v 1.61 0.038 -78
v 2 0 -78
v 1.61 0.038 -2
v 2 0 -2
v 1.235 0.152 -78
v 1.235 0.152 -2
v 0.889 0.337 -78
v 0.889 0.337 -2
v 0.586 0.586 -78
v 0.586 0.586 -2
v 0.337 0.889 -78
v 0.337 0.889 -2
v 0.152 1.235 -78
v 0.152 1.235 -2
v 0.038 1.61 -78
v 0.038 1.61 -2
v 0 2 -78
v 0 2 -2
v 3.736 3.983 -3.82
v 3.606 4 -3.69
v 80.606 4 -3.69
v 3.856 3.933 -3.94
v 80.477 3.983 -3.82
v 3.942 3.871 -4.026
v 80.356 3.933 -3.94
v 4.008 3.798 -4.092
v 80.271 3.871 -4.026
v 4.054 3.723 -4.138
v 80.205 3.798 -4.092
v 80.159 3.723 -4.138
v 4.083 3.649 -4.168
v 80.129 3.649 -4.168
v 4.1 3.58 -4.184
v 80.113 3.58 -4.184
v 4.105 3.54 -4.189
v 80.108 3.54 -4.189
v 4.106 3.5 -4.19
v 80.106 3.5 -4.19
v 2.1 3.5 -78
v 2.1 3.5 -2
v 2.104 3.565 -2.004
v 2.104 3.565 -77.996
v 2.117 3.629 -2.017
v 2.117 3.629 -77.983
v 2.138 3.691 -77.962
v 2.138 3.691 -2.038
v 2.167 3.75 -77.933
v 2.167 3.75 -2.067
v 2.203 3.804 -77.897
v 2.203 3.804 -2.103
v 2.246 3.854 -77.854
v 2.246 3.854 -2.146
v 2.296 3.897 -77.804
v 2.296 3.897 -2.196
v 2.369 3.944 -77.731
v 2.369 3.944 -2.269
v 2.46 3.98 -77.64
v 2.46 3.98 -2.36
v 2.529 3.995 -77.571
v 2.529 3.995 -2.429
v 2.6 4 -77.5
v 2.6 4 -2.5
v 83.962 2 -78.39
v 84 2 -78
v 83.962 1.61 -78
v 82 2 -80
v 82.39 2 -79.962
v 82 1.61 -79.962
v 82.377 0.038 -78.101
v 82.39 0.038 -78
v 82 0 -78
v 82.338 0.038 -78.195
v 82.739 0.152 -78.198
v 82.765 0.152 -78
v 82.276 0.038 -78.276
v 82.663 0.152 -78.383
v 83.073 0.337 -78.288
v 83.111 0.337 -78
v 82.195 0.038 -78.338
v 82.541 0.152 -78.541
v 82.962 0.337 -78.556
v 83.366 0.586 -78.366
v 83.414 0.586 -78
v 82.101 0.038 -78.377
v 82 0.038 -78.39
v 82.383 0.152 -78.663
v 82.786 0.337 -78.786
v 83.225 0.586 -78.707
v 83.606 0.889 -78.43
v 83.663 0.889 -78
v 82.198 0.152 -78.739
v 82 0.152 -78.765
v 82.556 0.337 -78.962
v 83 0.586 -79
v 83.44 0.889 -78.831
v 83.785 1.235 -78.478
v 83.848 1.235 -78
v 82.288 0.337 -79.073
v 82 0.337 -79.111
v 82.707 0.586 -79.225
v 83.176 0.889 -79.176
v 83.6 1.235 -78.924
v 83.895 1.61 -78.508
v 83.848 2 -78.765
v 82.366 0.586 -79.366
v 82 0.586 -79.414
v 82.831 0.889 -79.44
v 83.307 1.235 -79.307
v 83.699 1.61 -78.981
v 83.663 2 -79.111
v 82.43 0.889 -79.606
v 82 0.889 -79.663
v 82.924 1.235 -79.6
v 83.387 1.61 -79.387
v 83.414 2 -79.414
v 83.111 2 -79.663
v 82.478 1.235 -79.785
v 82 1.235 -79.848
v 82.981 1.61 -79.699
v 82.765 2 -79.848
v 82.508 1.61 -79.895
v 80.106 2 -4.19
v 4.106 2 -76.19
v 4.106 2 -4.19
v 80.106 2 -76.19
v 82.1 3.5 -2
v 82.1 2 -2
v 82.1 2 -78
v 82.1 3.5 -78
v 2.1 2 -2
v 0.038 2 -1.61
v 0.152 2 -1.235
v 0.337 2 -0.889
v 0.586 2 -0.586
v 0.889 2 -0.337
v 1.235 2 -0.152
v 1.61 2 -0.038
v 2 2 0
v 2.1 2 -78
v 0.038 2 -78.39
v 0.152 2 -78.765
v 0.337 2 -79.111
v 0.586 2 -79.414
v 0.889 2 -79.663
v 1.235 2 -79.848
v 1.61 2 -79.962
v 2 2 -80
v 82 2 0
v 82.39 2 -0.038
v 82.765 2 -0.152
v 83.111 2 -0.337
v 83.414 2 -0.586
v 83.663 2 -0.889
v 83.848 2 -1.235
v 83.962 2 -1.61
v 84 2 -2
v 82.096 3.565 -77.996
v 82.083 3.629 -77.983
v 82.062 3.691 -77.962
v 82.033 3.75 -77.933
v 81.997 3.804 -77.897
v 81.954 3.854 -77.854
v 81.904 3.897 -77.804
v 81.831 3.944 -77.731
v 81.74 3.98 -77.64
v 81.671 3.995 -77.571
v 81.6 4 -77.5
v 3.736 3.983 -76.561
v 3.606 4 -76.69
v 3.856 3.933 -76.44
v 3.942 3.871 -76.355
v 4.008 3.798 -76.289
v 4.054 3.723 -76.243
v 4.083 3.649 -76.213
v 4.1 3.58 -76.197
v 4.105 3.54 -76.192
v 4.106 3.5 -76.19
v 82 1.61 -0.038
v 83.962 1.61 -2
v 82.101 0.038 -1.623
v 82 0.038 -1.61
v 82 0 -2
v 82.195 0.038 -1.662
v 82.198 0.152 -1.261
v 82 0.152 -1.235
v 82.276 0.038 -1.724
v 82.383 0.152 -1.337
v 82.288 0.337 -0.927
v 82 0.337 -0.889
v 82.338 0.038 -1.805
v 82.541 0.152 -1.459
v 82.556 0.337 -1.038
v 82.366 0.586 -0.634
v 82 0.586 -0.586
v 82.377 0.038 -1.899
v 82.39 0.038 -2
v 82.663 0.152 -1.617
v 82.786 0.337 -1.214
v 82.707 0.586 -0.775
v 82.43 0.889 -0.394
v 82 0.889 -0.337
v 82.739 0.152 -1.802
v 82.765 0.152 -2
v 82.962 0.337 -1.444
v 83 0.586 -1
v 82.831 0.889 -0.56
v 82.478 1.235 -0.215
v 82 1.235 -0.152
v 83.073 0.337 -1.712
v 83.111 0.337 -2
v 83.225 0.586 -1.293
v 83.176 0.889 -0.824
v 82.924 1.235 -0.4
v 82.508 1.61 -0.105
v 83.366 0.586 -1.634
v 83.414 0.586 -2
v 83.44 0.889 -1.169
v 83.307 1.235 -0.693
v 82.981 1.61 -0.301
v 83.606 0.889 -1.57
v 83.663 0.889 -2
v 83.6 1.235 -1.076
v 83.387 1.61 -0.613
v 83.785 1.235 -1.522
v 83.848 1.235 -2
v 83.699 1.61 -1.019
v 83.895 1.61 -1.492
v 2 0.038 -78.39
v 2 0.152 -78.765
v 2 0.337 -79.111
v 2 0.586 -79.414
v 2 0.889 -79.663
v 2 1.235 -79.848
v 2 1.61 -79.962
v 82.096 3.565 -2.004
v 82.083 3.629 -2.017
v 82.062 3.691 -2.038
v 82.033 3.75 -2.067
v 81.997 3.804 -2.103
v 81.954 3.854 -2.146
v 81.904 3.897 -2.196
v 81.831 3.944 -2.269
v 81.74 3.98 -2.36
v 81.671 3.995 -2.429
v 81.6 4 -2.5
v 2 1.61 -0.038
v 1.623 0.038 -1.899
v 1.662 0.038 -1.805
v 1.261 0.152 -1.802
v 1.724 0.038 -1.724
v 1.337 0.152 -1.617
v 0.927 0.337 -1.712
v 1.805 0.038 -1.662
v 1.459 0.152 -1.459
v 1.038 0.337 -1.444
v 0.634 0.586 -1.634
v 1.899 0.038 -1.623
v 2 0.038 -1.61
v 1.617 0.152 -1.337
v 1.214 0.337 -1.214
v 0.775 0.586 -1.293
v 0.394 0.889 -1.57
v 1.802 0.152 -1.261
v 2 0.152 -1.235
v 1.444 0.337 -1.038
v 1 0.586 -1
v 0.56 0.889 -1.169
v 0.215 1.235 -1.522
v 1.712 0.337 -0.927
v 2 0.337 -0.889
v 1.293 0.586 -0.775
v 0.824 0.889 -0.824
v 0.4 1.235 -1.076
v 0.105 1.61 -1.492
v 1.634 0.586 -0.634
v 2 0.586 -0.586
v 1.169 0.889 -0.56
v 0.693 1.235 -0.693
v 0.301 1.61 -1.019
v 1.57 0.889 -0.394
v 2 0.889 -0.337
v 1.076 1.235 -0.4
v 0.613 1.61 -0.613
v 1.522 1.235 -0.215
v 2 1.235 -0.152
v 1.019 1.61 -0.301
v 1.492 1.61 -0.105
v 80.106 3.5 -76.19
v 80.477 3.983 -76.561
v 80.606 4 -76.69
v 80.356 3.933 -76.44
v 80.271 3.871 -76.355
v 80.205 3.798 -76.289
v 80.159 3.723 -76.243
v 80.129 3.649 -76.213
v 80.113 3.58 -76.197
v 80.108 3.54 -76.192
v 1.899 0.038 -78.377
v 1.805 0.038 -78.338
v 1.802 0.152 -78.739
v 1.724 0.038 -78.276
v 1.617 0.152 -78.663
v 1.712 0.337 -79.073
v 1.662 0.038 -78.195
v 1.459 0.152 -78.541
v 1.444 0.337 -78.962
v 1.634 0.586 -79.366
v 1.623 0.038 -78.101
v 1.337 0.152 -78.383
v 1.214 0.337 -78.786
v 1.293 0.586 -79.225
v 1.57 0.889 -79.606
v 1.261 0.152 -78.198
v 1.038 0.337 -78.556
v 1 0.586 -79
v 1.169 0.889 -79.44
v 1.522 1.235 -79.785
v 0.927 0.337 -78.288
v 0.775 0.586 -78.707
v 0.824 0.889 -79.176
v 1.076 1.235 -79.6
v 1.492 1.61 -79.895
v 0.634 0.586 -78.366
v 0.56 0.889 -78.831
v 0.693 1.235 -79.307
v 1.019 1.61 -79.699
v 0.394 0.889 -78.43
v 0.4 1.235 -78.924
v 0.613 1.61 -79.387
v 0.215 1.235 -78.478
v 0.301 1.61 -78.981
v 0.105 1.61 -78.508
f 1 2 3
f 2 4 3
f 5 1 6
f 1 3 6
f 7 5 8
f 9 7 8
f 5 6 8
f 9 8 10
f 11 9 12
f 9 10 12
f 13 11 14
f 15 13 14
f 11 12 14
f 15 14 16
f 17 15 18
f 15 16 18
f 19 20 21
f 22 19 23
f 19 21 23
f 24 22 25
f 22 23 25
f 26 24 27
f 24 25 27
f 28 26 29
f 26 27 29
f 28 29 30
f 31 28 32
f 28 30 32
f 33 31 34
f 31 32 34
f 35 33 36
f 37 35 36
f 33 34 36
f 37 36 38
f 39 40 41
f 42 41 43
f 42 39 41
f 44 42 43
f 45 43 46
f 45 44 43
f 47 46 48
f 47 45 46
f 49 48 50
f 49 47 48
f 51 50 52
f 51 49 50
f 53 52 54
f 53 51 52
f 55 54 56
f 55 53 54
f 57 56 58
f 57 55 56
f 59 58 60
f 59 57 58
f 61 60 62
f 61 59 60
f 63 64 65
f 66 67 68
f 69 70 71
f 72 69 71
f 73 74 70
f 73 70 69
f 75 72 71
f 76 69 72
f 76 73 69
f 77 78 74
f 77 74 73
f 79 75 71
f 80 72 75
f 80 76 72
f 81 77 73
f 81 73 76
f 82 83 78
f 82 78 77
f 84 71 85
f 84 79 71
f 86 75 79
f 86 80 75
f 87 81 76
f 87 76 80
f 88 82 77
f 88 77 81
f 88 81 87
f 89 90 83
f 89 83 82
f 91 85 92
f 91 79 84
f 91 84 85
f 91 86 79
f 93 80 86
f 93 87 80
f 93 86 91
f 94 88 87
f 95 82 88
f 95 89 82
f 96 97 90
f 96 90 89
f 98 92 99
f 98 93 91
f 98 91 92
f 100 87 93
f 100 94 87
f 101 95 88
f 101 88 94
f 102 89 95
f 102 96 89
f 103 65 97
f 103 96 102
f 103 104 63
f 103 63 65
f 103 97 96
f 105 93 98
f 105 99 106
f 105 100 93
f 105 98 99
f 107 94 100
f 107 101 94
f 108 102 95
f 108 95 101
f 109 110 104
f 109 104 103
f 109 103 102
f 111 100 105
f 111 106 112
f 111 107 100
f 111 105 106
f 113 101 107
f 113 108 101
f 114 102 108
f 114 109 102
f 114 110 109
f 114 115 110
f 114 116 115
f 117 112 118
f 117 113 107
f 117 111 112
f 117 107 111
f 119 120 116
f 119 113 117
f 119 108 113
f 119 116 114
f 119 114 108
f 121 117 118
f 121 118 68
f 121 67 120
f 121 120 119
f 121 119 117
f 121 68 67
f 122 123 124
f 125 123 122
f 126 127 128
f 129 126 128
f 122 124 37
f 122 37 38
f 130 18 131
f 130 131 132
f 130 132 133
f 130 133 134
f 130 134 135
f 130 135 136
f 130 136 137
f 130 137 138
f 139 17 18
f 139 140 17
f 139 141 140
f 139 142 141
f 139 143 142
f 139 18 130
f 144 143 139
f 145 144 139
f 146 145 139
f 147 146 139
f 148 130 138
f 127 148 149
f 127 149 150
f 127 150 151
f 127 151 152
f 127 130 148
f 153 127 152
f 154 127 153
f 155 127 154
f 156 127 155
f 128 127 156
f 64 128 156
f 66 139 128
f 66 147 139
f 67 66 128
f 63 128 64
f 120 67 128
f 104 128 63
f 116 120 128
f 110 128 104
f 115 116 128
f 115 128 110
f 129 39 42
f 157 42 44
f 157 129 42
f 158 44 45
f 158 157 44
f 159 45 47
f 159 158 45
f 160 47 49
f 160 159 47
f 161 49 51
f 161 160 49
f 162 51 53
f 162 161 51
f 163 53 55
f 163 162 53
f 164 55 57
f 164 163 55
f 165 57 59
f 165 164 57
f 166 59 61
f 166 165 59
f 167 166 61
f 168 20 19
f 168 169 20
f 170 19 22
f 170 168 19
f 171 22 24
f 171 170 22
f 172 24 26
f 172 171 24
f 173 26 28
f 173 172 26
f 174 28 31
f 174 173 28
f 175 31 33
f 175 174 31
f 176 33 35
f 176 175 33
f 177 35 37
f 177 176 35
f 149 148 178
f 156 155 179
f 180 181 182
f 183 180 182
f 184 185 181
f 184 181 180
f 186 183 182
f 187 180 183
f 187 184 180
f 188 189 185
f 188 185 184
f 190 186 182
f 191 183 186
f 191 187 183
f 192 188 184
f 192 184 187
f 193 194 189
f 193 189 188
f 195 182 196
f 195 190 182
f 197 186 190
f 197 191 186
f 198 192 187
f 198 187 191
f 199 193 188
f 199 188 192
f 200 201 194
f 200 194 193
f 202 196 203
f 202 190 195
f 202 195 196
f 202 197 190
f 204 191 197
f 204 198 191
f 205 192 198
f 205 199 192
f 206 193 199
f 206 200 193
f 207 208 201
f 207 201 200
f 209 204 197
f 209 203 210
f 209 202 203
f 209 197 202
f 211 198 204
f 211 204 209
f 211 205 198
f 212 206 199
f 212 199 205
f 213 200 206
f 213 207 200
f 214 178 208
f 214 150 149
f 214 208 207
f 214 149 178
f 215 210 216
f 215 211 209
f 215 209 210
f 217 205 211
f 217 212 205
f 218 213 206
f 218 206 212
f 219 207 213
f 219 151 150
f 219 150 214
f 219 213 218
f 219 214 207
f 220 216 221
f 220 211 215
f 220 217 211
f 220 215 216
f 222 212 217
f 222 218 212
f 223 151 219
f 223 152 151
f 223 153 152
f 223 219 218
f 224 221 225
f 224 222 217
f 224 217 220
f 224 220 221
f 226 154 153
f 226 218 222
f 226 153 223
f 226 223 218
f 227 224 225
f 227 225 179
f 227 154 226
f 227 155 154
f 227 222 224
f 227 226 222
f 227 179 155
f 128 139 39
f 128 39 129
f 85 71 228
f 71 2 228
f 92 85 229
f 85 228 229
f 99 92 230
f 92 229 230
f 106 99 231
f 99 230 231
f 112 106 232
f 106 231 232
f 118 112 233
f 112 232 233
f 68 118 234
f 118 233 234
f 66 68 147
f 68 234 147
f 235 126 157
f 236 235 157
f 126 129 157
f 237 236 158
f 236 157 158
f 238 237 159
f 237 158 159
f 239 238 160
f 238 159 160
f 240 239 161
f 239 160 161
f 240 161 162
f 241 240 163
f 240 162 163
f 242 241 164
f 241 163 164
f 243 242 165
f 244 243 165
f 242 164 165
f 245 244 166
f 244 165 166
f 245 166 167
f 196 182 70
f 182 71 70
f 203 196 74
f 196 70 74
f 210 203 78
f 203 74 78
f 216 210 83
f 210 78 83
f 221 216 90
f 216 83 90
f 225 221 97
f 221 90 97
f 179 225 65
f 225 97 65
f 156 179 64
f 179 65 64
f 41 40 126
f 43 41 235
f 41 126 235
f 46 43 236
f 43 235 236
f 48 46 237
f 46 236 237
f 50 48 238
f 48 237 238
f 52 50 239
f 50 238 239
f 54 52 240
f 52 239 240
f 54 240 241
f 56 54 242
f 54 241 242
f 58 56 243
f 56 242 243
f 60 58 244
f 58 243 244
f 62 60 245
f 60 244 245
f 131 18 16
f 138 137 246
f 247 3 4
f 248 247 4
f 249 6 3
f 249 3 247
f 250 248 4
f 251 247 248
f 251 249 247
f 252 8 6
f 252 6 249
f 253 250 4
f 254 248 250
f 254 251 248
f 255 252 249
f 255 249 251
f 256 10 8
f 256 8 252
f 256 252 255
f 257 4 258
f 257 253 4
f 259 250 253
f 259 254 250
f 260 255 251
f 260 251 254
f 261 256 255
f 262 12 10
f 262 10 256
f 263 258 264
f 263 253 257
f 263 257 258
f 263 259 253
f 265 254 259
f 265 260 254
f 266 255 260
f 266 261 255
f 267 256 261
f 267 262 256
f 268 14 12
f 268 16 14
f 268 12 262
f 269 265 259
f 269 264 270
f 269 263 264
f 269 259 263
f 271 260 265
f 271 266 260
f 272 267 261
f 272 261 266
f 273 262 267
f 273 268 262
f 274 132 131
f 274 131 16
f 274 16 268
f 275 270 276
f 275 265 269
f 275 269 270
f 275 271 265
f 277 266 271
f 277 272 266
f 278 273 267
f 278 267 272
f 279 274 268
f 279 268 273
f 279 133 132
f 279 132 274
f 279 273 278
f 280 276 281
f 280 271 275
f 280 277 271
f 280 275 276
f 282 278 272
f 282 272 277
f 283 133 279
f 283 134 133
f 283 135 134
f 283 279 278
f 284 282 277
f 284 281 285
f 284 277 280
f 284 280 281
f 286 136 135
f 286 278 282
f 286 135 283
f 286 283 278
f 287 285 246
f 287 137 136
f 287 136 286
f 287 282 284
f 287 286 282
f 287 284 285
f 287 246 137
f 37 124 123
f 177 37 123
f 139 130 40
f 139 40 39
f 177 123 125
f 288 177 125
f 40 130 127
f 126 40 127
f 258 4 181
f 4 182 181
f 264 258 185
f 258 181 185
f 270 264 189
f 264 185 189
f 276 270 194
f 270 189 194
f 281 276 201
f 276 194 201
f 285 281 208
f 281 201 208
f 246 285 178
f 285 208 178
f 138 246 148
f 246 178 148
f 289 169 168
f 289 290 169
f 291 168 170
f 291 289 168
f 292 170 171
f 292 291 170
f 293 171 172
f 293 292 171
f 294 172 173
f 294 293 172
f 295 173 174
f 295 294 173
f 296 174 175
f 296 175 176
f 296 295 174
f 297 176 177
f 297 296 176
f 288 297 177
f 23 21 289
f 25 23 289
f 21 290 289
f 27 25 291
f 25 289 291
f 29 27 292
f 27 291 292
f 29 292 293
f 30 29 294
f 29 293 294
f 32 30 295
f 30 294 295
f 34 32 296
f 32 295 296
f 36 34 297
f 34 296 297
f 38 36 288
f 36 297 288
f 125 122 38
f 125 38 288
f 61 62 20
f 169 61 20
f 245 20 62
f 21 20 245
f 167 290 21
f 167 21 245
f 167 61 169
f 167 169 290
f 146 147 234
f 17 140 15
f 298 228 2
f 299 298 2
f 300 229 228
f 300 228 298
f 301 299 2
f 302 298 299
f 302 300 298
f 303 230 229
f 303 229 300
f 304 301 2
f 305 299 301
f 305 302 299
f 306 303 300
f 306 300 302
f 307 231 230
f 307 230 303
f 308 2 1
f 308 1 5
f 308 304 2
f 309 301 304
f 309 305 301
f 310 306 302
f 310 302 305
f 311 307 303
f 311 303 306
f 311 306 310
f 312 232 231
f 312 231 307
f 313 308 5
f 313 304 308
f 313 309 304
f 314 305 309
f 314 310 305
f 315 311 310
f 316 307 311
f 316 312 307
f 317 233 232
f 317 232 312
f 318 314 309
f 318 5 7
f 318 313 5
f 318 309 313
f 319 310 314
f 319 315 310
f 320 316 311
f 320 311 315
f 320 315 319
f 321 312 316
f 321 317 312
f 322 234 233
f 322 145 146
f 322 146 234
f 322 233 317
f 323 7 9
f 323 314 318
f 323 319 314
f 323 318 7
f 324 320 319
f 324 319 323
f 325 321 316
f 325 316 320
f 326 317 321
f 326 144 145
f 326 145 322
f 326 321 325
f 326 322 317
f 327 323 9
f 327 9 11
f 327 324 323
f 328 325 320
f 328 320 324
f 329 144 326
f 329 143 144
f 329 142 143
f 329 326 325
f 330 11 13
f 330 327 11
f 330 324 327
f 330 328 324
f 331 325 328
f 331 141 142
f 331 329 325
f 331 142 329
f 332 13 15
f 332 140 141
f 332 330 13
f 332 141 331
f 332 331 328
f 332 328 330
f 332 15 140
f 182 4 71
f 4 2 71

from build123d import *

# Parameters (mm, degrees)
SKETCH1_W           = 84
SKETCH1_H           = 80
BOSS_EXTRUDE1_DEPTH = 2
SKETCH3_W           = 80
SKETCH3_H           = 76
SKETCH3_W_2         = 76
SKETCH3_H_2         = 72
BOSS_EXTRUDE2_DEPTH = 2
FILLET1_R           = 2
FILLET2_R           = 2
FILLET3_R           = 0.5


with BuildPart() as part:
    # Sketch1 → Boss-Extrude1 (new body)
    with BuildSketch(Plane(origin=(0, 0, 0), x_dir=(1, 0, 0), z_dir=(0, 1, 0))):
        with Locations((42, 40)):
            Rectangle(SKETCH1_W, SKETCH1_H)
    extrude(amount=BOSS_EXTRUDE1_DEPTH)

    # Sketch3 → Boss-Extrude2 (add)
    with BuildSketch(Plane(origin=(0, 2, 0), x_dir=(1, 0, 0), z_dir=(0, 1, 0))):
        with Locations((42.1, 40)):
            Rectangle(SKETCH3_W, SKETCH3_H)
        with Locations((42.106134664, 40.19047619)):
            Rectangle(SKETCH3_W_2, SKETCH3_H_2, mode=Mode.SUBTRACT)
    extrude(amount=BOSS_EXTRUDE2_DEPTH)

    # Fillet1
    fillet1_edges = [part.edges().sort_by_distance(p)[0] for p in [
        (0, 1, -80),
        (84, 1, -80),
        (84, 1, 0),
        (0, 1, 0),
    ]]
    fillet(fillet1_edges, radius=FILLET1_R)

    # Fillet2
    fillet2_edges = [part.edges().sort_by_distance(p)[0] for p in [
        (0.585786438, 0, -0.585786438),
        (0.585786438, 0, -79.414213562),
        (83.414213562, 0, -79.414213562),
        (83.414213562, 0, -0.585786438),
        (84, 0, -40),
        (42, 0, -80),
        (0, 0, -40),
        (42, 0, 0),
    ]]
    fillet(fillet2_edges, radius=FILLET2_R - 0.0001)  # a hair under: the kernel refuses the full size

    # Fillet3
    fillet3_edges = [part.edges().sort_by_distance(p)[0] for p in [
        (42.1, 4, -2),
        (82.1, 4, -40),
        (42.1, 4, -78),
        (2.1, 4, -40),
        (42.106134664, 4, -4.19047619),
        (80.106134664, 4, -40.19047619),
        (42.106134664, 4, -76.19047619),
        (4.106134664, 4, -40.19047619),
    ]]
    fillet(fillet3_edges, radius=FILLET3_R)


solid = part.part
